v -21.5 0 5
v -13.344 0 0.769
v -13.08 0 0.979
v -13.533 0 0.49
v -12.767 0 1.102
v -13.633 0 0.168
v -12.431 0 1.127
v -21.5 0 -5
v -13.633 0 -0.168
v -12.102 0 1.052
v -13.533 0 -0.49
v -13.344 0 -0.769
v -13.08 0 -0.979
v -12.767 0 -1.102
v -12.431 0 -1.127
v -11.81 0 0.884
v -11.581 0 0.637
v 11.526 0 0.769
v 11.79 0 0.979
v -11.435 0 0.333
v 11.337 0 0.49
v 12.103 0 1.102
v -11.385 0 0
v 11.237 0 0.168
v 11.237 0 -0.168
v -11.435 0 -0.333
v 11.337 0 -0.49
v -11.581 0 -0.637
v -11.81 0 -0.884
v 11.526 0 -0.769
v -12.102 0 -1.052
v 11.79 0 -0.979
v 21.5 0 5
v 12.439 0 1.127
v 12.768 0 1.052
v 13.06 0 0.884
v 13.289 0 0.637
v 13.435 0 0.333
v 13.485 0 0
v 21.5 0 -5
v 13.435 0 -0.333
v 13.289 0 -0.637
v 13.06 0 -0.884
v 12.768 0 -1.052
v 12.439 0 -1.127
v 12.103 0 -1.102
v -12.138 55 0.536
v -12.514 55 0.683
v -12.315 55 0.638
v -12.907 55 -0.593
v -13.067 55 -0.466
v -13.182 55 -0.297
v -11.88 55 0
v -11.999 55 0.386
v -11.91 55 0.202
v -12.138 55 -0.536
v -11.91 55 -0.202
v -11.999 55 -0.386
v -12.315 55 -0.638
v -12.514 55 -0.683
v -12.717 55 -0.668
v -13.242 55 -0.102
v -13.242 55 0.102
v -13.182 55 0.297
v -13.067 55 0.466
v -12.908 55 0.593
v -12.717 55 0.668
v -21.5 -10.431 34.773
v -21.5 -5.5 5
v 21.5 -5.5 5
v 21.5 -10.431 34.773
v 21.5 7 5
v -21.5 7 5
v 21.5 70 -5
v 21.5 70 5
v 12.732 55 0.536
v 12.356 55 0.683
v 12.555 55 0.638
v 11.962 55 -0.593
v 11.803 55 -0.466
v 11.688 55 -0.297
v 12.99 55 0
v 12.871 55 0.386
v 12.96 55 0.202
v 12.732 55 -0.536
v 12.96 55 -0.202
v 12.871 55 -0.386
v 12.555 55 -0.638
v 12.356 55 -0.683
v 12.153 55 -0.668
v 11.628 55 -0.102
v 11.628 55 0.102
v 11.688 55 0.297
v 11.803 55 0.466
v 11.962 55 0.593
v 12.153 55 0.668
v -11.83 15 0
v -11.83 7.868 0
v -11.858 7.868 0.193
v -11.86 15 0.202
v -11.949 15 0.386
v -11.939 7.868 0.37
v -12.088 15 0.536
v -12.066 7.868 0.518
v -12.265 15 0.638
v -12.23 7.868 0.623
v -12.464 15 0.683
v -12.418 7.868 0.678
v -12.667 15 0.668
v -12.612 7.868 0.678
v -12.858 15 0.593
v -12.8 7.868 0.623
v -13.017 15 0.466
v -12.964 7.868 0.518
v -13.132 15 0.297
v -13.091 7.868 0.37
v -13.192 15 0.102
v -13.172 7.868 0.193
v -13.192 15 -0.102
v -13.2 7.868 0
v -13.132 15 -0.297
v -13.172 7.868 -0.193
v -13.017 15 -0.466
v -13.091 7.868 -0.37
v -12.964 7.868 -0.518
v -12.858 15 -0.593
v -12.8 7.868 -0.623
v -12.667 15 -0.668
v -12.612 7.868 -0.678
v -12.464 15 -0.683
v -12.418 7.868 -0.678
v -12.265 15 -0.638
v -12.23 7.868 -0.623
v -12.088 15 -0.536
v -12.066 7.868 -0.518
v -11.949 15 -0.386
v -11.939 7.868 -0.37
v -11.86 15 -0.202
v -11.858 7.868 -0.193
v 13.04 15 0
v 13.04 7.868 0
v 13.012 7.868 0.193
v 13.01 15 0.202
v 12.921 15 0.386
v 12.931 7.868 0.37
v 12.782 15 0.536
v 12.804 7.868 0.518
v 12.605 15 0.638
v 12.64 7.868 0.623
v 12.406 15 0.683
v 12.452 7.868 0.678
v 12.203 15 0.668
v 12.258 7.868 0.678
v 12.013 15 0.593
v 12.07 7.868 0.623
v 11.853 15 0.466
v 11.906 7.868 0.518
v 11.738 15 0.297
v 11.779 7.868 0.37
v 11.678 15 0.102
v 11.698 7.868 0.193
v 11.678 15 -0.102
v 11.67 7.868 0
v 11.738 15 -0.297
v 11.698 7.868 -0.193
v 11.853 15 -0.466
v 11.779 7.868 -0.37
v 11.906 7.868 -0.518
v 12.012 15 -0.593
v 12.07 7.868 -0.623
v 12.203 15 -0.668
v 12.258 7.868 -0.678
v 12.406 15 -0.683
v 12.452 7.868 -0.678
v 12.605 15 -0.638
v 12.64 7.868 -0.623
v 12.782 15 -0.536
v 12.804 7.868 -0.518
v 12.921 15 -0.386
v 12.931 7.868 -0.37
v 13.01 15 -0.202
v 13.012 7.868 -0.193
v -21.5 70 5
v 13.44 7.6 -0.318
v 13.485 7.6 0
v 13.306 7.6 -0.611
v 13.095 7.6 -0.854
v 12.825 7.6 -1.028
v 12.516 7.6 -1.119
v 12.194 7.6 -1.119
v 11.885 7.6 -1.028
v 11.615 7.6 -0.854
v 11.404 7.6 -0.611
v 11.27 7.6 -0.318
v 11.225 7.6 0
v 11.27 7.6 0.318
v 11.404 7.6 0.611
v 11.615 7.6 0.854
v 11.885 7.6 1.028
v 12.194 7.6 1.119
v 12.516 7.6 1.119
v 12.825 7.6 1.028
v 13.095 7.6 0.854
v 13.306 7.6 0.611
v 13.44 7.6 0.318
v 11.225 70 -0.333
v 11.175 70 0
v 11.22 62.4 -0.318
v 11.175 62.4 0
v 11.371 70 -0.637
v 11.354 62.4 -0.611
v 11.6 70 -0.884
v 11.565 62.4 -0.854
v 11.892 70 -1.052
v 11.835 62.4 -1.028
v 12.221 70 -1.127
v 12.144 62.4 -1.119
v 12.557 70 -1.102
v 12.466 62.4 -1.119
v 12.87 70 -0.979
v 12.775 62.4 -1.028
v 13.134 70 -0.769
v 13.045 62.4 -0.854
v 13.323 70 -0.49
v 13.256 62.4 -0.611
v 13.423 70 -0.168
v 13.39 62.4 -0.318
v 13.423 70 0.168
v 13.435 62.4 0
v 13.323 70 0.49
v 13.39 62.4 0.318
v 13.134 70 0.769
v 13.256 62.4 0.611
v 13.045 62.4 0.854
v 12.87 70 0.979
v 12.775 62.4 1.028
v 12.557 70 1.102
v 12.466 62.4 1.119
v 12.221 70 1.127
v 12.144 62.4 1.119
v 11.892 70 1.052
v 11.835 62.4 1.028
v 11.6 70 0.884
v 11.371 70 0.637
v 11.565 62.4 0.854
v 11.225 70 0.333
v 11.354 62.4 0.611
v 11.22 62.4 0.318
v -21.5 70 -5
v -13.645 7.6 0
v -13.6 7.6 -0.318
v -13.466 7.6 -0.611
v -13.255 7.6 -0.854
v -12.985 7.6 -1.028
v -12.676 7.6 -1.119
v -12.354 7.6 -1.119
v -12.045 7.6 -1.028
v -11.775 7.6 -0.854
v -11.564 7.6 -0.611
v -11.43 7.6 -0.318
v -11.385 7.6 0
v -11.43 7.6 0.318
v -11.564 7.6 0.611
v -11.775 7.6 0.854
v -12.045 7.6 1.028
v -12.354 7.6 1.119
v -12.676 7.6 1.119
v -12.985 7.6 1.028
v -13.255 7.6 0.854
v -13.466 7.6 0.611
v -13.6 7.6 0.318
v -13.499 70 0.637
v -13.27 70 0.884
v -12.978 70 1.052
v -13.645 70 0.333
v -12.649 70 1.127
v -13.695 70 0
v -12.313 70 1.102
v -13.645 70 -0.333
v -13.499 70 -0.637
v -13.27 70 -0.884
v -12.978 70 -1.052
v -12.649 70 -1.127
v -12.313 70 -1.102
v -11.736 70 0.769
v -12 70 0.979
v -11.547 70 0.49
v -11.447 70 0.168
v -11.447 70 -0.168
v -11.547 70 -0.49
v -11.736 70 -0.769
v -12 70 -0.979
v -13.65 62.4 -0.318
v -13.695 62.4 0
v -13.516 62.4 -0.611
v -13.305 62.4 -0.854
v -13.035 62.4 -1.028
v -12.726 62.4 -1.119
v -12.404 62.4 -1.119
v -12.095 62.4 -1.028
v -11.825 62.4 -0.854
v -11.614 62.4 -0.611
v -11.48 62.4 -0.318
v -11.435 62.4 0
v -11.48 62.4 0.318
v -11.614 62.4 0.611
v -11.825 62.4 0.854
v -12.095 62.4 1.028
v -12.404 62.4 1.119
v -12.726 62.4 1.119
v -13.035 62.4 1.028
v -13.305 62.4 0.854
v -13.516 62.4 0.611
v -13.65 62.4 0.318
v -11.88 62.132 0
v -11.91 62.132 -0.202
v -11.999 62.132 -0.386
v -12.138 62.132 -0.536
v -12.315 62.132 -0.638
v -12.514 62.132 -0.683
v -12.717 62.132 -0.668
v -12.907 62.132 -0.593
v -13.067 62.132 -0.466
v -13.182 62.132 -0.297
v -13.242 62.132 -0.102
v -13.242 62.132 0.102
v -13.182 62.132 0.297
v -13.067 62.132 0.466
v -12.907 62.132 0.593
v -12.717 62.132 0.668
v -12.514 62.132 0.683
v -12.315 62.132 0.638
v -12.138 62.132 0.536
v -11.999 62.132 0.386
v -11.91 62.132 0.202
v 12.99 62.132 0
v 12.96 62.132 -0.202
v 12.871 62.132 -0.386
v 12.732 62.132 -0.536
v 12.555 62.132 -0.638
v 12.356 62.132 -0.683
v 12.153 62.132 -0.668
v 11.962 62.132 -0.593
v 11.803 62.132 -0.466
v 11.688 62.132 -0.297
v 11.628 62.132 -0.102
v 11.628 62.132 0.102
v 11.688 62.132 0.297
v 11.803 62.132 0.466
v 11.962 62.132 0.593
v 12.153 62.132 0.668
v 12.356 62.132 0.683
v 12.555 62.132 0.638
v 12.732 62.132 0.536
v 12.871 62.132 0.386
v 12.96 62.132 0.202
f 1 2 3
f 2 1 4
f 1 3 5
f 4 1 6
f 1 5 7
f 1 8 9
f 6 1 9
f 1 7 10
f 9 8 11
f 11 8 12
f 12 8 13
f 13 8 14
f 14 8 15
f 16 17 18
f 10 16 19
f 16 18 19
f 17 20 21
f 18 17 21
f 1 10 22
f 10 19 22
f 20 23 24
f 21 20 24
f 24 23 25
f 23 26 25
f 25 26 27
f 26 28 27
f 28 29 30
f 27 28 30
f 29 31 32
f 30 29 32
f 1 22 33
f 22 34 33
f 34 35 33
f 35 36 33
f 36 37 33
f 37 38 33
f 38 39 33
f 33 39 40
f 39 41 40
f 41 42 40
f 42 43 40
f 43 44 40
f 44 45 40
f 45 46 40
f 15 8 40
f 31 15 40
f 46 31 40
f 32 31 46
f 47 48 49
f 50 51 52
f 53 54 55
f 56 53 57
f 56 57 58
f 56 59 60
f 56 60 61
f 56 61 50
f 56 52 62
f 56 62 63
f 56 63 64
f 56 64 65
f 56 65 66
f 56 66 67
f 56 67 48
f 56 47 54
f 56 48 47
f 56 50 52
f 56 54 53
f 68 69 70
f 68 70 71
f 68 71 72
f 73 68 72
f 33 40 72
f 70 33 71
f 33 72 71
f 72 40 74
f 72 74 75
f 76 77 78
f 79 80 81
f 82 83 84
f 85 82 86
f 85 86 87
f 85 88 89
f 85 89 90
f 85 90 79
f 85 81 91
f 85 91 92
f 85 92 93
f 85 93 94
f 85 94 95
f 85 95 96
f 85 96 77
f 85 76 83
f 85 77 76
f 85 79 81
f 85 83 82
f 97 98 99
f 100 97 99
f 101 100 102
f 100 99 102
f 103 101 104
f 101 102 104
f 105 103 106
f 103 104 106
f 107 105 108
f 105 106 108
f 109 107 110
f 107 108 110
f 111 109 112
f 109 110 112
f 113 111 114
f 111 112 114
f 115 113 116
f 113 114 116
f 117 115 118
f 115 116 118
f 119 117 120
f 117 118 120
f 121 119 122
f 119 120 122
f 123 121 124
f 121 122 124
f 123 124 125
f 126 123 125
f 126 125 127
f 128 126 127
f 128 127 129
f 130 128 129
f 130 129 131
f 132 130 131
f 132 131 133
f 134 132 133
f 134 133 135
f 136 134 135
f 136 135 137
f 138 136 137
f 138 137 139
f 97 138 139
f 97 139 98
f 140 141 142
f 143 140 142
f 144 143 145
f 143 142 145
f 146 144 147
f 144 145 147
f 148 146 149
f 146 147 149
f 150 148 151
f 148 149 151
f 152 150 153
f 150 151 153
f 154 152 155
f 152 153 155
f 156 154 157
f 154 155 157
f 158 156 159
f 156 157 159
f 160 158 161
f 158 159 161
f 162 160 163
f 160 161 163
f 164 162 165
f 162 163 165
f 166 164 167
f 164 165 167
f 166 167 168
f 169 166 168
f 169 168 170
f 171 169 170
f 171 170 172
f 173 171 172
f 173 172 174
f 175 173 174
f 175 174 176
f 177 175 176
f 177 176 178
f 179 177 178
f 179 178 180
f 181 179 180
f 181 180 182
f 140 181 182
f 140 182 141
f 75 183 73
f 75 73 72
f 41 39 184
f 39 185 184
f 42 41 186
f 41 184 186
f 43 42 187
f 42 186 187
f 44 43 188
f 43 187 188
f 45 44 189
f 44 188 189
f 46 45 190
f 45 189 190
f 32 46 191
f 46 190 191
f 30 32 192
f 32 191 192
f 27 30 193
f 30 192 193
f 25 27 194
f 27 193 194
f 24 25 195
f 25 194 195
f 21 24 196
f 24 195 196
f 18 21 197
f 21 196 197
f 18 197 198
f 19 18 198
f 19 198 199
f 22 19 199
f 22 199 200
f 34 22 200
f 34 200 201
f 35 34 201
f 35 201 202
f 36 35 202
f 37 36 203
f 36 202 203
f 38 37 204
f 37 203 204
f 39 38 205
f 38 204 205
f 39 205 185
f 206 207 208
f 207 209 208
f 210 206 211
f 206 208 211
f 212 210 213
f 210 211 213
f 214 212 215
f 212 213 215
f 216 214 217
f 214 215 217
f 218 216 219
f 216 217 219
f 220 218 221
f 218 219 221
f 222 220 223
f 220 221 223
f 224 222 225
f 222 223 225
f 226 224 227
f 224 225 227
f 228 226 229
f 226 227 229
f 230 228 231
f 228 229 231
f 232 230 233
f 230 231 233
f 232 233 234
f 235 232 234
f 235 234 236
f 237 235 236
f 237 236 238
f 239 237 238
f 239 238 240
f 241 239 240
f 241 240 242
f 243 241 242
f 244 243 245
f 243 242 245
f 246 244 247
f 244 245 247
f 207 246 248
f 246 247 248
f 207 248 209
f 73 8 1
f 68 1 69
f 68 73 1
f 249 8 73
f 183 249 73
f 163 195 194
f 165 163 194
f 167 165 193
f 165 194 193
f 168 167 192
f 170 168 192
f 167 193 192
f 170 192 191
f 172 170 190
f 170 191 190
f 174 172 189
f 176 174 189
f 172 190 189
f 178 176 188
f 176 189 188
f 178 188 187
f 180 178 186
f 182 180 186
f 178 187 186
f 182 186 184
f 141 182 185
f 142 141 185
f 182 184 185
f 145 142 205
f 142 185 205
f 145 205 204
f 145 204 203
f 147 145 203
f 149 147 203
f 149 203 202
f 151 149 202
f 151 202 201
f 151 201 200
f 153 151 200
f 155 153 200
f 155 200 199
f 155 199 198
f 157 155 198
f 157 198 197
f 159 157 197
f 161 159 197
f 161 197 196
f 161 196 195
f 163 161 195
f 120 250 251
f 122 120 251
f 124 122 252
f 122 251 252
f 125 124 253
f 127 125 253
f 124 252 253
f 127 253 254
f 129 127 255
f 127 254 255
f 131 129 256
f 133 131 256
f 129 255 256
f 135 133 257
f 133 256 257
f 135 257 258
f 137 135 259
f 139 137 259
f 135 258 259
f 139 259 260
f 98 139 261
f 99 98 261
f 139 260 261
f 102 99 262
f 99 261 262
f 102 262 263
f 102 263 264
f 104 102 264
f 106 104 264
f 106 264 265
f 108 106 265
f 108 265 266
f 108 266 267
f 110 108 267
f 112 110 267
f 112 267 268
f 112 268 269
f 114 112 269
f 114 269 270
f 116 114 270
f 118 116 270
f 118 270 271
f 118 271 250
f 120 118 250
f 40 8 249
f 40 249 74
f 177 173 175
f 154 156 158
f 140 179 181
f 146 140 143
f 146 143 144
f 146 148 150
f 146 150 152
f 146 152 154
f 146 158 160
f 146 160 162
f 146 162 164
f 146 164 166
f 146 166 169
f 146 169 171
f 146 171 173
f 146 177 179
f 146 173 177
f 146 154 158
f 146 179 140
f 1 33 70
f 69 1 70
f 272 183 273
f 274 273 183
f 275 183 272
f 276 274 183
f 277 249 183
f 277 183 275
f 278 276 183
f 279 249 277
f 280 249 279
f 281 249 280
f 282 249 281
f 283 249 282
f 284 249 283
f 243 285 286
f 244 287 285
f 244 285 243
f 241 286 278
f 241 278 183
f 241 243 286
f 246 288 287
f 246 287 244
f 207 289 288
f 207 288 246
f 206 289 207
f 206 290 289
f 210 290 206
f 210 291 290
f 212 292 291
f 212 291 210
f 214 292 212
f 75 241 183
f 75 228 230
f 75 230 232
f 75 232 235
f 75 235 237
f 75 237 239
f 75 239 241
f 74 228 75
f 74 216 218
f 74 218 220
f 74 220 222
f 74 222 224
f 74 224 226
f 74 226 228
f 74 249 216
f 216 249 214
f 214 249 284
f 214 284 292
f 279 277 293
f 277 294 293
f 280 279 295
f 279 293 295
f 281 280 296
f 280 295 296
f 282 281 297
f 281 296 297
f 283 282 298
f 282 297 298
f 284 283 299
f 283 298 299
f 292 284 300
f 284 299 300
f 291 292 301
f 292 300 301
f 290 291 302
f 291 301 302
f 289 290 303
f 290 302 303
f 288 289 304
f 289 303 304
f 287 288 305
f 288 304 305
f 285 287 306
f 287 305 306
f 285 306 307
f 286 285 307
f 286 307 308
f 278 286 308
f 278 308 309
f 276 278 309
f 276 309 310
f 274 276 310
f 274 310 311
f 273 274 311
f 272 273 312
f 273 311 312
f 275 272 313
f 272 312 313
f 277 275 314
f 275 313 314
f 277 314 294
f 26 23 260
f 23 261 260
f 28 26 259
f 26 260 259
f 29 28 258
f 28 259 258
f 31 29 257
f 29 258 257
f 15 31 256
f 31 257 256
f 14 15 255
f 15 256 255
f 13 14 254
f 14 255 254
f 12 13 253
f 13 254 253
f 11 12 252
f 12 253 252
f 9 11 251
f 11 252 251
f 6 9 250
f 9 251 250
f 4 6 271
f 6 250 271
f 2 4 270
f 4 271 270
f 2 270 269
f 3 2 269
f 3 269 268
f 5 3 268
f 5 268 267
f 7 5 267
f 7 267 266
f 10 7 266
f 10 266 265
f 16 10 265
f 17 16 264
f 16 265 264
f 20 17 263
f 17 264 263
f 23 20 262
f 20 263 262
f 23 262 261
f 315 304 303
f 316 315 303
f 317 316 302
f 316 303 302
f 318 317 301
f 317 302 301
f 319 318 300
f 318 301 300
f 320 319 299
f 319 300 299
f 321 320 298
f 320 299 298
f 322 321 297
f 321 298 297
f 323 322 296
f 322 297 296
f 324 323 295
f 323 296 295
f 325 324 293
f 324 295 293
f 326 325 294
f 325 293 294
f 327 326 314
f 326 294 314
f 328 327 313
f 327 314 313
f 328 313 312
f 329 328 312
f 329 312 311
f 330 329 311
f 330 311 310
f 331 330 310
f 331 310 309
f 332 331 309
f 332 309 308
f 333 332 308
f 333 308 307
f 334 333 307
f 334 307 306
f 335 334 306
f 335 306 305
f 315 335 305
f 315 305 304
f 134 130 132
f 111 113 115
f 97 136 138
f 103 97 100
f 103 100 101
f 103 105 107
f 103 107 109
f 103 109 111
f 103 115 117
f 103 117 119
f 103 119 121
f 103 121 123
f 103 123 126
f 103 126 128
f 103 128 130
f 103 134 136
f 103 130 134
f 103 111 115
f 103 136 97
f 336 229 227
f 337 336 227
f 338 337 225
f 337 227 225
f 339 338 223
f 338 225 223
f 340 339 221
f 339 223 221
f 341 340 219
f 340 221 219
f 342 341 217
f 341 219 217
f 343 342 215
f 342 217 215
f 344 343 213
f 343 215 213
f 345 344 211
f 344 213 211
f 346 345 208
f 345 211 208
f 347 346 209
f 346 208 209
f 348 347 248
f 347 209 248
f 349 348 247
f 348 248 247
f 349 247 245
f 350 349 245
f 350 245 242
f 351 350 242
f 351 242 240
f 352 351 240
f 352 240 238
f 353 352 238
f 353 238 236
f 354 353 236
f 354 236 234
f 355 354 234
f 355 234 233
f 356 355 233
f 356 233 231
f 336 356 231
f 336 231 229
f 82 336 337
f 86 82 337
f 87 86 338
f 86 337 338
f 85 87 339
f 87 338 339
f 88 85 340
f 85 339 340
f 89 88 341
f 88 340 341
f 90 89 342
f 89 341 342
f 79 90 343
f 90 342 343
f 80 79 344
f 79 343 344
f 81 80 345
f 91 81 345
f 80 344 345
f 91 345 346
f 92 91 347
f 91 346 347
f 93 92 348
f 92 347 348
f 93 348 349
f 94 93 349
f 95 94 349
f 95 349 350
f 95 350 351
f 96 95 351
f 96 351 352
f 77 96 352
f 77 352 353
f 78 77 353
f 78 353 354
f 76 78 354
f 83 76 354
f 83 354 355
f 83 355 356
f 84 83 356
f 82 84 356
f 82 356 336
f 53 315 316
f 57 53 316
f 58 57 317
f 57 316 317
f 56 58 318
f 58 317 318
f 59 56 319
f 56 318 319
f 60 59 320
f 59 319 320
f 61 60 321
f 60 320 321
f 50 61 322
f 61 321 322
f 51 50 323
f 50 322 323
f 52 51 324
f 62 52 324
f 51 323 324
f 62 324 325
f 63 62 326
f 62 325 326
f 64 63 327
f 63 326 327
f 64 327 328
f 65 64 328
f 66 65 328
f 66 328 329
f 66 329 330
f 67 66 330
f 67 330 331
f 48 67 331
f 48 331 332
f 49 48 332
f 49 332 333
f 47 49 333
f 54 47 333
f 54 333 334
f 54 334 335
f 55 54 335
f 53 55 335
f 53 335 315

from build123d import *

# Parameters (mm, degrees)
SKETCH1_W                 = 43
SKETCH1_H                 = 10
BOSS_EXTRUDE1_DEPTH       = 70
BOSS_EXTRUDE3_DEPTH       = 43
SKETCH3_R                 = 0.685
CUT_EXTRUDE1_DEPTH        = 15
SKETCH4_R                 = 0.685
CUT_EXTRUDE2_DEPTH        = 15
F_4_40_TAPPED_HOLE1_D     = 2.2606
F_4_40_TAPPED_HOLE1_DEPTH = 7.6
F_4_40_TAPPED_HOLE1_TIP   = 0.679152758
F_4_40_TAPPED_HOLE2_D     = 2.2606
F_4_40_TAPPED_HOLE2_DEPTH = 7.6
F_4_40_TAPPED_HOLE2_TIP   = 0.679152758


with BuildPart() as part:
    # Sketch1 → Boss-Extrude1 (new body)
    with BuildSketch(Plane(origin=(0, 0, 0), x_dir=(1, 0, 0), z_dir=(0, 1, 0))):
        Rectangle(SKETCH1_W, SKETCH1_H)
    extrude(amount=BOSS_EXTRUDE1_DEPTH)

    # Sketch2 → Boss-Extrude3 (add)
    with BuildSketch(Plane(origin=(21.5, 0, 0), x_dir=(0, 0, -1), z_dir=(1, 0, 0))):
        Polygon((-5, 7), (-5, -5.5), (-34.772622472, -10.431034139), align=None)
    extrude(amount=-BOSS_EXTRUDE3_DEPTH)

    # Sketch3 → Cut-Extrude1 (cut)
    with BuildSketch(Plane.XZ):
        with Locations((-12.515, 0)):
            Circle(SKETCH3_R)
        with Locations((12.355, 0)):
            Circle(SKETCH3_R)
    extrude(amount=-CUT_EXTRUDE1_DEPTH, mode=Mode.SUBTRACT)

    # Sketch4 → Cut-Extrude2 (cut)
    with BuildSketch(Plane(origin=(0, 70, 0), x_dir=(1, 0, 0), z_dir=(0, 1, 0))):
        with Locations((-12.565, 0)):
            Circle(SKETCH4_R)
        with Locations((12.305, 0)):
            Circle(SKETCH4_R)
    extrude(amount=-CUT_EXTRUDE2_DEPTH, mode=Mode.SUBTRACT)

    # #4-40 Tapped Hole1
    with Locations(Plane(origin=(0, 70, 0), x_dir=(1, 0, 0), z_dir=(0, 1, 0))):
        with Locations((12.305, 0), (-12.565, 0)):
            Hole(F_4_40_TAPPED_HOLE1_D / 2, depth=F_4_40_TAPPED_HOLE1_DEPTH)
            with Locations((0, 0, -(F_4_40_TAPPED_HOLE1_DEPTH + F_4_40_TAPPED_HOLE1_TIP / 2))):  # 118° drill point
                Cone(0, F_4_40_TAPPED_HOLE1_D / 2, F_4_40_TAPPED_HOLE1_TIP, mode=Mode.SUBTRACT)

    # #4-40 Tapped Hole2
    with Locations(Plane(origin=(0, 0, 0), x_dir=(-1, 0, 0), z_dir=(0, -1, 0))):
        with Locations((-12.355, 0), (12.515, 0)):
            Hole(F_4_40_TAPPED_HOLE2_D / 2, depth=F_4_40_TAPPED_HOLE2_DEPTH)
            with Locations((0, 0, -(F_4_40_TAPPED_HOLE2_DEPTH + F_4_40_TAPPED_HOLE2_TIP / 2))):  # 118° drill point
                Cone(0, F_4_40_TAPPED_HOLE2_D / 2, F_4_40_TAPPED_HOLE2_TIP, mode=Mode.SUBTRACT)


solid = part.part
